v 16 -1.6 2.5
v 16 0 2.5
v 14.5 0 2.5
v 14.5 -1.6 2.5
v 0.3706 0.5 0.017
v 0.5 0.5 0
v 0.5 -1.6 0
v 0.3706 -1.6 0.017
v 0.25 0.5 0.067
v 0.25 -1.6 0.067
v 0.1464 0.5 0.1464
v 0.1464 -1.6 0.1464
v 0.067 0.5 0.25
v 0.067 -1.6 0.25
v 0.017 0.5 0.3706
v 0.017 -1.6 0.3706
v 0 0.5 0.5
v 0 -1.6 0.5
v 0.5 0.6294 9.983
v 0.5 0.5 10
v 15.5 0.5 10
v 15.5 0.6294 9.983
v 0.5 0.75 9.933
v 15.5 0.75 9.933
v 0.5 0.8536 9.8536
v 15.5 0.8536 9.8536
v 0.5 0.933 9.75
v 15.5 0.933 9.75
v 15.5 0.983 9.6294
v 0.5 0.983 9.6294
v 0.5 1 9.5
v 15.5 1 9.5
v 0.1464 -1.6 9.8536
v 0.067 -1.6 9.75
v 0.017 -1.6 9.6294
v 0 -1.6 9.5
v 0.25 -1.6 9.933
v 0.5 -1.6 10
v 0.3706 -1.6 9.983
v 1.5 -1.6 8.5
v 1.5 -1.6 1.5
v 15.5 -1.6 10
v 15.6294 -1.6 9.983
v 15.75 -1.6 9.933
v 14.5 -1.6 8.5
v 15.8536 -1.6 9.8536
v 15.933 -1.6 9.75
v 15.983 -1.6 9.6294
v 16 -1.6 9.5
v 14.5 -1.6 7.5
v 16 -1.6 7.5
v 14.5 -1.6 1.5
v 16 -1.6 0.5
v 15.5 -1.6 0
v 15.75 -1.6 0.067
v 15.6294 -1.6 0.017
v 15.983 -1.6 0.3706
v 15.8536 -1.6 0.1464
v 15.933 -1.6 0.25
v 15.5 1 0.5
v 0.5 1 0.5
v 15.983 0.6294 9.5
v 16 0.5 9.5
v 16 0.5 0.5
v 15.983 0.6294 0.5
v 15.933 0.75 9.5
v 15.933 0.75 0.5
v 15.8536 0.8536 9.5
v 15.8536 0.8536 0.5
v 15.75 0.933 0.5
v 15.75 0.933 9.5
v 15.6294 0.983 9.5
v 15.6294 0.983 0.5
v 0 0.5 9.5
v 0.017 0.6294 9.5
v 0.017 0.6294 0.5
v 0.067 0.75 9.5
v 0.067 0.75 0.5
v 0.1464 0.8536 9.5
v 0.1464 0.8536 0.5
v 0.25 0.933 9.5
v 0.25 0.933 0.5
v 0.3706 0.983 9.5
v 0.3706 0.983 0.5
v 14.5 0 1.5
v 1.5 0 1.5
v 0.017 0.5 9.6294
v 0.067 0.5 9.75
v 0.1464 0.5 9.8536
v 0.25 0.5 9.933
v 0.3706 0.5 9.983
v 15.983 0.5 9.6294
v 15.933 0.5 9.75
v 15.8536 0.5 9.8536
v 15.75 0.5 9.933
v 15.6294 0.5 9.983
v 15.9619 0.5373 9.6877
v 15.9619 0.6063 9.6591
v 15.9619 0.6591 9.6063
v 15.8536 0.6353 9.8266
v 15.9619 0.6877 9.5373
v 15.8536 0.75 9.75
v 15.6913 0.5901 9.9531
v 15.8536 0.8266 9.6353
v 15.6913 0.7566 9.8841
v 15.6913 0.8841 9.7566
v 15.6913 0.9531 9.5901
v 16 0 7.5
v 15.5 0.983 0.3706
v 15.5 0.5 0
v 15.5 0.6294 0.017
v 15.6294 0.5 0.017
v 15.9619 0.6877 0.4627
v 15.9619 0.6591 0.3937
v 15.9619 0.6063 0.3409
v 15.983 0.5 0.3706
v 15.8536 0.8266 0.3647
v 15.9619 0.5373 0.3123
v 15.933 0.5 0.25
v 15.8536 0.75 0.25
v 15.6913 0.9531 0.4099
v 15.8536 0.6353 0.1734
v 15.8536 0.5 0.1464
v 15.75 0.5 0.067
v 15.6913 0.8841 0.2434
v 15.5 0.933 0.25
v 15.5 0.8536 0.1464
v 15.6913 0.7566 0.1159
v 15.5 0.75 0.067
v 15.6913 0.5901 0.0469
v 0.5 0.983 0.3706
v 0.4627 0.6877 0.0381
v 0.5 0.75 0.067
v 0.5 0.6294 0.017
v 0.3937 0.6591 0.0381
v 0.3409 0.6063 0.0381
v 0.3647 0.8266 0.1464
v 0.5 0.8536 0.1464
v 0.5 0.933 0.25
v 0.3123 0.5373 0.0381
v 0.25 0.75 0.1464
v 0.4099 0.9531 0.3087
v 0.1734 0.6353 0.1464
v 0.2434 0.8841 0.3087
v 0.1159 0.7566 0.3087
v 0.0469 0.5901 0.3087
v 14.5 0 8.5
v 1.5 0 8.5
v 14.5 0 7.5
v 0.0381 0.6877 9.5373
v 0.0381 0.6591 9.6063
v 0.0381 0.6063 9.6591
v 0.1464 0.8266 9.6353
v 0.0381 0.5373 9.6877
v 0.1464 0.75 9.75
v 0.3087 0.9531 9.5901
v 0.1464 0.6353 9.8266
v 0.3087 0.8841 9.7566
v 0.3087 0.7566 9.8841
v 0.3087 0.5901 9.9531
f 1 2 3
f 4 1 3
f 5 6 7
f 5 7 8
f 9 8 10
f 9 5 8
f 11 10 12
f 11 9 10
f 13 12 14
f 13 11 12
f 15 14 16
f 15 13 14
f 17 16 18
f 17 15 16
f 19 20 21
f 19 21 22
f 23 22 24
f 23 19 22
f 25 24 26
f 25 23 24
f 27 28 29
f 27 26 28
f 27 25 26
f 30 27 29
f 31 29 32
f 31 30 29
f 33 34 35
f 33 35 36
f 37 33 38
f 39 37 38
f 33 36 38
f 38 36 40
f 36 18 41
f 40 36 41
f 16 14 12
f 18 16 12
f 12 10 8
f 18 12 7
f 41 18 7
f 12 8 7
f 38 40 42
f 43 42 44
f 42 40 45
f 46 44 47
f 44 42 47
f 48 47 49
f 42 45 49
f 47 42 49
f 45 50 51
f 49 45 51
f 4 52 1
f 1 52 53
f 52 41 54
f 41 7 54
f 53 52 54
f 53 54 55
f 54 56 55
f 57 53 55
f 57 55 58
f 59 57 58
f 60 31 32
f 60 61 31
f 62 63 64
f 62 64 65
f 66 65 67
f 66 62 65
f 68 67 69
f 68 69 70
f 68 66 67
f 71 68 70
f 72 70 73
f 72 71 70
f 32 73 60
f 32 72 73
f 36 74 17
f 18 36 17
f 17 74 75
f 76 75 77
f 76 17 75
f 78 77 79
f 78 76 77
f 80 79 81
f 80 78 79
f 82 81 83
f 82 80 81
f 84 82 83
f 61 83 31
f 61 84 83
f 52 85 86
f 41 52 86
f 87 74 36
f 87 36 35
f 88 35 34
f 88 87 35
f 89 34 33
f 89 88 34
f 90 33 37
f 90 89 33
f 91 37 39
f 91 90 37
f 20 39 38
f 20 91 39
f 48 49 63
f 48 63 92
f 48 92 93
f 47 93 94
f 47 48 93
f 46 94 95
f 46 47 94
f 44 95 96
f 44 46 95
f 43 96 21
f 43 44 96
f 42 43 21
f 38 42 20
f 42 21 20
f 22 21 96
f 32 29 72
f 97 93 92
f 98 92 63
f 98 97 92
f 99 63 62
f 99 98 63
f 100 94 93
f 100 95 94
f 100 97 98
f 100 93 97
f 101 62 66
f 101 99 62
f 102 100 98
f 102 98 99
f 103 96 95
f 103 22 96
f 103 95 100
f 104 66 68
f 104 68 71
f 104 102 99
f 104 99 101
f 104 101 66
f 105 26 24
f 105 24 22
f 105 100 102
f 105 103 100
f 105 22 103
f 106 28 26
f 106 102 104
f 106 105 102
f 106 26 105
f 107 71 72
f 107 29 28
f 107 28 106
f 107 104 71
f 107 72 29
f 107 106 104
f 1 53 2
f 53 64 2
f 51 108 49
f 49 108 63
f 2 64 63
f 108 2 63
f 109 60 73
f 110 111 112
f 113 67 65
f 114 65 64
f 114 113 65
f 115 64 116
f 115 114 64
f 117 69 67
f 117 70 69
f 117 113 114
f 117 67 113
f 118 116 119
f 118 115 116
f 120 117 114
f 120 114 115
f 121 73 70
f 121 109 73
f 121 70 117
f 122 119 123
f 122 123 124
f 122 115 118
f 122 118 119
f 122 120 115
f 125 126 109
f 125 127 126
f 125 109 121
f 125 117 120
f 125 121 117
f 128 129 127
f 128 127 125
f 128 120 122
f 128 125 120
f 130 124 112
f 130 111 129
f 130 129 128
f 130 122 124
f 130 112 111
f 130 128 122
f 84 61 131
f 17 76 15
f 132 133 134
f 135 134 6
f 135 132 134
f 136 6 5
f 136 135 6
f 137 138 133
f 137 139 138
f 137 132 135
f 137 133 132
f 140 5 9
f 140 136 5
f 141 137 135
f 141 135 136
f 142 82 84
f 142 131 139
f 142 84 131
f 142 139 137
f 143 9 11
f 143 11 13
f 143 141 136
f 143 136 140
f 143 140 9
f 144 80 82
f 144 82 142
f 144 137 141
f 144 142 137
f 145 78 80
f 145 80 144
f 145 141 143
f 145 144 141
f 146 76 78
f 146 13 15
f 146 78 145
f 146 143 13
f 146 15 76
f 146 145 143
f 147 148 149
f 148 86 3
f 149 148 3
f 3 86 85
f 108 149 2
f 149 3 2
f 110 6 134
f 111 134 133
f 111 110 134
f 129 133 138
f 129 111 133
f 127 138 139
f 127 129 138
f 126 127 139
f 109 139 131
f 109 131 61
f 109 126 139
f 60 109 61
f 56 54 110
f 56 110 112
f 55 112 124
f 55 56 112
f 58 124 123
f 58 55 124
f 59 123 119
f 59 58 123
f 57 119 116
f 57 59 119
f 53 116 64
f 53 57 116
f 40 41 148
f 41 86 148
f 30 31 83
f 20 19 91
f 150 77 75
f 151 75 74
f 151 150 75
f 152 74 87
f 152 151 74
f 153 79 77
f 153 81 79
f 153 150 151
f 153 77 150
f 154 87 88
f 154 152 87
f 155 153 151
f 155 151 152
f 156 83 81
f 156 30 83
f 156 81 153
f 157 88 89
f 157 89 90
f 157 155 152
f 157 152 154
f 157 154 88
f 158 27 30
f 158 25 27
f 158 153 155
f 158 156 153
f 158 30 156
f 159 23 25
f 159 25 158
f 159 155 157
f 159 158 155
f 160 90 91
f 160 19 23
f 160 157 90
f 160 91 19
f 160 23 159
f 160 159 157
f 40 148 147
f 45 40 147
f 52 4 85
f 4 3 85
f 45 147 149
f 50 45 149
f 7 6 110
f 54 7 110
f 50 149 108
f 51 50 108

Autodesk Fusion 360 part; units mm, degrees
sketch "Sketch1" plane through (0, 0, 0) normal (0, 1, 0) x (1, 0, 0)
  line L0 (0, 0) -> (16, 0)
  line L1 (16, -10) -> (0, -10)
  line L2 (0, -10) -> (0, 0)
  line L3 (1.5, -8.5) -> (14.5, -8.5)
  line L4 (14.5, -1.5) -> (1.5, -1.5)
  line L5 (1.5, -1.5) -> (1.5, -8.5)
  line L6 (14.5, -7.5) -> (16, -7.5)
  line L7 (16, -2.5) -> (14.5, -2.5)
  line L8 (16, 0) -> (16, -2.5)
  line L9 (16, -7.5) -> (16, -10)
  line L10 (14.5, -8.5) -> (14.5, -7.5)
  line L11 (14.5, -2.5) -> (14.5, -1.5)
  line L12 (0, -10) -> (16, -10)
  line L13 (16, -10) -> (16, 0)
  line L14 (16, 0) -> (0, 0)
  line L15 (0, 0) -> (0, -10)
  dimension "d2" = 1.5
  dimension "d3" = 1.5
  dimension "d4" = 1.5
  dimension "d5" = 1.5
  dimension "d7" = 1
  dimension "d8" = 1
  dimension "d9" = 13
  dimension "d10" = 10
extrude "Extrude1" add sketch "Sketch1" along normal blind 1
extrude "Extrude2" add sketch "Sketch1" against normal blind 1.6 contours L0 L1 L2 L3 L4 L5 L6 L7 L8 L9 L10 L11 L12 L13 L14 L15
fillet "Fillet1" radius 0.5 8 edges at (8, 1, 10) (0, 1, 5) (8, 1, 0) (16, 1, 5) (16, -0.3, 0) (0, -0.3, 0) (0, -0.3, 10) (16, -0.3, 10)
